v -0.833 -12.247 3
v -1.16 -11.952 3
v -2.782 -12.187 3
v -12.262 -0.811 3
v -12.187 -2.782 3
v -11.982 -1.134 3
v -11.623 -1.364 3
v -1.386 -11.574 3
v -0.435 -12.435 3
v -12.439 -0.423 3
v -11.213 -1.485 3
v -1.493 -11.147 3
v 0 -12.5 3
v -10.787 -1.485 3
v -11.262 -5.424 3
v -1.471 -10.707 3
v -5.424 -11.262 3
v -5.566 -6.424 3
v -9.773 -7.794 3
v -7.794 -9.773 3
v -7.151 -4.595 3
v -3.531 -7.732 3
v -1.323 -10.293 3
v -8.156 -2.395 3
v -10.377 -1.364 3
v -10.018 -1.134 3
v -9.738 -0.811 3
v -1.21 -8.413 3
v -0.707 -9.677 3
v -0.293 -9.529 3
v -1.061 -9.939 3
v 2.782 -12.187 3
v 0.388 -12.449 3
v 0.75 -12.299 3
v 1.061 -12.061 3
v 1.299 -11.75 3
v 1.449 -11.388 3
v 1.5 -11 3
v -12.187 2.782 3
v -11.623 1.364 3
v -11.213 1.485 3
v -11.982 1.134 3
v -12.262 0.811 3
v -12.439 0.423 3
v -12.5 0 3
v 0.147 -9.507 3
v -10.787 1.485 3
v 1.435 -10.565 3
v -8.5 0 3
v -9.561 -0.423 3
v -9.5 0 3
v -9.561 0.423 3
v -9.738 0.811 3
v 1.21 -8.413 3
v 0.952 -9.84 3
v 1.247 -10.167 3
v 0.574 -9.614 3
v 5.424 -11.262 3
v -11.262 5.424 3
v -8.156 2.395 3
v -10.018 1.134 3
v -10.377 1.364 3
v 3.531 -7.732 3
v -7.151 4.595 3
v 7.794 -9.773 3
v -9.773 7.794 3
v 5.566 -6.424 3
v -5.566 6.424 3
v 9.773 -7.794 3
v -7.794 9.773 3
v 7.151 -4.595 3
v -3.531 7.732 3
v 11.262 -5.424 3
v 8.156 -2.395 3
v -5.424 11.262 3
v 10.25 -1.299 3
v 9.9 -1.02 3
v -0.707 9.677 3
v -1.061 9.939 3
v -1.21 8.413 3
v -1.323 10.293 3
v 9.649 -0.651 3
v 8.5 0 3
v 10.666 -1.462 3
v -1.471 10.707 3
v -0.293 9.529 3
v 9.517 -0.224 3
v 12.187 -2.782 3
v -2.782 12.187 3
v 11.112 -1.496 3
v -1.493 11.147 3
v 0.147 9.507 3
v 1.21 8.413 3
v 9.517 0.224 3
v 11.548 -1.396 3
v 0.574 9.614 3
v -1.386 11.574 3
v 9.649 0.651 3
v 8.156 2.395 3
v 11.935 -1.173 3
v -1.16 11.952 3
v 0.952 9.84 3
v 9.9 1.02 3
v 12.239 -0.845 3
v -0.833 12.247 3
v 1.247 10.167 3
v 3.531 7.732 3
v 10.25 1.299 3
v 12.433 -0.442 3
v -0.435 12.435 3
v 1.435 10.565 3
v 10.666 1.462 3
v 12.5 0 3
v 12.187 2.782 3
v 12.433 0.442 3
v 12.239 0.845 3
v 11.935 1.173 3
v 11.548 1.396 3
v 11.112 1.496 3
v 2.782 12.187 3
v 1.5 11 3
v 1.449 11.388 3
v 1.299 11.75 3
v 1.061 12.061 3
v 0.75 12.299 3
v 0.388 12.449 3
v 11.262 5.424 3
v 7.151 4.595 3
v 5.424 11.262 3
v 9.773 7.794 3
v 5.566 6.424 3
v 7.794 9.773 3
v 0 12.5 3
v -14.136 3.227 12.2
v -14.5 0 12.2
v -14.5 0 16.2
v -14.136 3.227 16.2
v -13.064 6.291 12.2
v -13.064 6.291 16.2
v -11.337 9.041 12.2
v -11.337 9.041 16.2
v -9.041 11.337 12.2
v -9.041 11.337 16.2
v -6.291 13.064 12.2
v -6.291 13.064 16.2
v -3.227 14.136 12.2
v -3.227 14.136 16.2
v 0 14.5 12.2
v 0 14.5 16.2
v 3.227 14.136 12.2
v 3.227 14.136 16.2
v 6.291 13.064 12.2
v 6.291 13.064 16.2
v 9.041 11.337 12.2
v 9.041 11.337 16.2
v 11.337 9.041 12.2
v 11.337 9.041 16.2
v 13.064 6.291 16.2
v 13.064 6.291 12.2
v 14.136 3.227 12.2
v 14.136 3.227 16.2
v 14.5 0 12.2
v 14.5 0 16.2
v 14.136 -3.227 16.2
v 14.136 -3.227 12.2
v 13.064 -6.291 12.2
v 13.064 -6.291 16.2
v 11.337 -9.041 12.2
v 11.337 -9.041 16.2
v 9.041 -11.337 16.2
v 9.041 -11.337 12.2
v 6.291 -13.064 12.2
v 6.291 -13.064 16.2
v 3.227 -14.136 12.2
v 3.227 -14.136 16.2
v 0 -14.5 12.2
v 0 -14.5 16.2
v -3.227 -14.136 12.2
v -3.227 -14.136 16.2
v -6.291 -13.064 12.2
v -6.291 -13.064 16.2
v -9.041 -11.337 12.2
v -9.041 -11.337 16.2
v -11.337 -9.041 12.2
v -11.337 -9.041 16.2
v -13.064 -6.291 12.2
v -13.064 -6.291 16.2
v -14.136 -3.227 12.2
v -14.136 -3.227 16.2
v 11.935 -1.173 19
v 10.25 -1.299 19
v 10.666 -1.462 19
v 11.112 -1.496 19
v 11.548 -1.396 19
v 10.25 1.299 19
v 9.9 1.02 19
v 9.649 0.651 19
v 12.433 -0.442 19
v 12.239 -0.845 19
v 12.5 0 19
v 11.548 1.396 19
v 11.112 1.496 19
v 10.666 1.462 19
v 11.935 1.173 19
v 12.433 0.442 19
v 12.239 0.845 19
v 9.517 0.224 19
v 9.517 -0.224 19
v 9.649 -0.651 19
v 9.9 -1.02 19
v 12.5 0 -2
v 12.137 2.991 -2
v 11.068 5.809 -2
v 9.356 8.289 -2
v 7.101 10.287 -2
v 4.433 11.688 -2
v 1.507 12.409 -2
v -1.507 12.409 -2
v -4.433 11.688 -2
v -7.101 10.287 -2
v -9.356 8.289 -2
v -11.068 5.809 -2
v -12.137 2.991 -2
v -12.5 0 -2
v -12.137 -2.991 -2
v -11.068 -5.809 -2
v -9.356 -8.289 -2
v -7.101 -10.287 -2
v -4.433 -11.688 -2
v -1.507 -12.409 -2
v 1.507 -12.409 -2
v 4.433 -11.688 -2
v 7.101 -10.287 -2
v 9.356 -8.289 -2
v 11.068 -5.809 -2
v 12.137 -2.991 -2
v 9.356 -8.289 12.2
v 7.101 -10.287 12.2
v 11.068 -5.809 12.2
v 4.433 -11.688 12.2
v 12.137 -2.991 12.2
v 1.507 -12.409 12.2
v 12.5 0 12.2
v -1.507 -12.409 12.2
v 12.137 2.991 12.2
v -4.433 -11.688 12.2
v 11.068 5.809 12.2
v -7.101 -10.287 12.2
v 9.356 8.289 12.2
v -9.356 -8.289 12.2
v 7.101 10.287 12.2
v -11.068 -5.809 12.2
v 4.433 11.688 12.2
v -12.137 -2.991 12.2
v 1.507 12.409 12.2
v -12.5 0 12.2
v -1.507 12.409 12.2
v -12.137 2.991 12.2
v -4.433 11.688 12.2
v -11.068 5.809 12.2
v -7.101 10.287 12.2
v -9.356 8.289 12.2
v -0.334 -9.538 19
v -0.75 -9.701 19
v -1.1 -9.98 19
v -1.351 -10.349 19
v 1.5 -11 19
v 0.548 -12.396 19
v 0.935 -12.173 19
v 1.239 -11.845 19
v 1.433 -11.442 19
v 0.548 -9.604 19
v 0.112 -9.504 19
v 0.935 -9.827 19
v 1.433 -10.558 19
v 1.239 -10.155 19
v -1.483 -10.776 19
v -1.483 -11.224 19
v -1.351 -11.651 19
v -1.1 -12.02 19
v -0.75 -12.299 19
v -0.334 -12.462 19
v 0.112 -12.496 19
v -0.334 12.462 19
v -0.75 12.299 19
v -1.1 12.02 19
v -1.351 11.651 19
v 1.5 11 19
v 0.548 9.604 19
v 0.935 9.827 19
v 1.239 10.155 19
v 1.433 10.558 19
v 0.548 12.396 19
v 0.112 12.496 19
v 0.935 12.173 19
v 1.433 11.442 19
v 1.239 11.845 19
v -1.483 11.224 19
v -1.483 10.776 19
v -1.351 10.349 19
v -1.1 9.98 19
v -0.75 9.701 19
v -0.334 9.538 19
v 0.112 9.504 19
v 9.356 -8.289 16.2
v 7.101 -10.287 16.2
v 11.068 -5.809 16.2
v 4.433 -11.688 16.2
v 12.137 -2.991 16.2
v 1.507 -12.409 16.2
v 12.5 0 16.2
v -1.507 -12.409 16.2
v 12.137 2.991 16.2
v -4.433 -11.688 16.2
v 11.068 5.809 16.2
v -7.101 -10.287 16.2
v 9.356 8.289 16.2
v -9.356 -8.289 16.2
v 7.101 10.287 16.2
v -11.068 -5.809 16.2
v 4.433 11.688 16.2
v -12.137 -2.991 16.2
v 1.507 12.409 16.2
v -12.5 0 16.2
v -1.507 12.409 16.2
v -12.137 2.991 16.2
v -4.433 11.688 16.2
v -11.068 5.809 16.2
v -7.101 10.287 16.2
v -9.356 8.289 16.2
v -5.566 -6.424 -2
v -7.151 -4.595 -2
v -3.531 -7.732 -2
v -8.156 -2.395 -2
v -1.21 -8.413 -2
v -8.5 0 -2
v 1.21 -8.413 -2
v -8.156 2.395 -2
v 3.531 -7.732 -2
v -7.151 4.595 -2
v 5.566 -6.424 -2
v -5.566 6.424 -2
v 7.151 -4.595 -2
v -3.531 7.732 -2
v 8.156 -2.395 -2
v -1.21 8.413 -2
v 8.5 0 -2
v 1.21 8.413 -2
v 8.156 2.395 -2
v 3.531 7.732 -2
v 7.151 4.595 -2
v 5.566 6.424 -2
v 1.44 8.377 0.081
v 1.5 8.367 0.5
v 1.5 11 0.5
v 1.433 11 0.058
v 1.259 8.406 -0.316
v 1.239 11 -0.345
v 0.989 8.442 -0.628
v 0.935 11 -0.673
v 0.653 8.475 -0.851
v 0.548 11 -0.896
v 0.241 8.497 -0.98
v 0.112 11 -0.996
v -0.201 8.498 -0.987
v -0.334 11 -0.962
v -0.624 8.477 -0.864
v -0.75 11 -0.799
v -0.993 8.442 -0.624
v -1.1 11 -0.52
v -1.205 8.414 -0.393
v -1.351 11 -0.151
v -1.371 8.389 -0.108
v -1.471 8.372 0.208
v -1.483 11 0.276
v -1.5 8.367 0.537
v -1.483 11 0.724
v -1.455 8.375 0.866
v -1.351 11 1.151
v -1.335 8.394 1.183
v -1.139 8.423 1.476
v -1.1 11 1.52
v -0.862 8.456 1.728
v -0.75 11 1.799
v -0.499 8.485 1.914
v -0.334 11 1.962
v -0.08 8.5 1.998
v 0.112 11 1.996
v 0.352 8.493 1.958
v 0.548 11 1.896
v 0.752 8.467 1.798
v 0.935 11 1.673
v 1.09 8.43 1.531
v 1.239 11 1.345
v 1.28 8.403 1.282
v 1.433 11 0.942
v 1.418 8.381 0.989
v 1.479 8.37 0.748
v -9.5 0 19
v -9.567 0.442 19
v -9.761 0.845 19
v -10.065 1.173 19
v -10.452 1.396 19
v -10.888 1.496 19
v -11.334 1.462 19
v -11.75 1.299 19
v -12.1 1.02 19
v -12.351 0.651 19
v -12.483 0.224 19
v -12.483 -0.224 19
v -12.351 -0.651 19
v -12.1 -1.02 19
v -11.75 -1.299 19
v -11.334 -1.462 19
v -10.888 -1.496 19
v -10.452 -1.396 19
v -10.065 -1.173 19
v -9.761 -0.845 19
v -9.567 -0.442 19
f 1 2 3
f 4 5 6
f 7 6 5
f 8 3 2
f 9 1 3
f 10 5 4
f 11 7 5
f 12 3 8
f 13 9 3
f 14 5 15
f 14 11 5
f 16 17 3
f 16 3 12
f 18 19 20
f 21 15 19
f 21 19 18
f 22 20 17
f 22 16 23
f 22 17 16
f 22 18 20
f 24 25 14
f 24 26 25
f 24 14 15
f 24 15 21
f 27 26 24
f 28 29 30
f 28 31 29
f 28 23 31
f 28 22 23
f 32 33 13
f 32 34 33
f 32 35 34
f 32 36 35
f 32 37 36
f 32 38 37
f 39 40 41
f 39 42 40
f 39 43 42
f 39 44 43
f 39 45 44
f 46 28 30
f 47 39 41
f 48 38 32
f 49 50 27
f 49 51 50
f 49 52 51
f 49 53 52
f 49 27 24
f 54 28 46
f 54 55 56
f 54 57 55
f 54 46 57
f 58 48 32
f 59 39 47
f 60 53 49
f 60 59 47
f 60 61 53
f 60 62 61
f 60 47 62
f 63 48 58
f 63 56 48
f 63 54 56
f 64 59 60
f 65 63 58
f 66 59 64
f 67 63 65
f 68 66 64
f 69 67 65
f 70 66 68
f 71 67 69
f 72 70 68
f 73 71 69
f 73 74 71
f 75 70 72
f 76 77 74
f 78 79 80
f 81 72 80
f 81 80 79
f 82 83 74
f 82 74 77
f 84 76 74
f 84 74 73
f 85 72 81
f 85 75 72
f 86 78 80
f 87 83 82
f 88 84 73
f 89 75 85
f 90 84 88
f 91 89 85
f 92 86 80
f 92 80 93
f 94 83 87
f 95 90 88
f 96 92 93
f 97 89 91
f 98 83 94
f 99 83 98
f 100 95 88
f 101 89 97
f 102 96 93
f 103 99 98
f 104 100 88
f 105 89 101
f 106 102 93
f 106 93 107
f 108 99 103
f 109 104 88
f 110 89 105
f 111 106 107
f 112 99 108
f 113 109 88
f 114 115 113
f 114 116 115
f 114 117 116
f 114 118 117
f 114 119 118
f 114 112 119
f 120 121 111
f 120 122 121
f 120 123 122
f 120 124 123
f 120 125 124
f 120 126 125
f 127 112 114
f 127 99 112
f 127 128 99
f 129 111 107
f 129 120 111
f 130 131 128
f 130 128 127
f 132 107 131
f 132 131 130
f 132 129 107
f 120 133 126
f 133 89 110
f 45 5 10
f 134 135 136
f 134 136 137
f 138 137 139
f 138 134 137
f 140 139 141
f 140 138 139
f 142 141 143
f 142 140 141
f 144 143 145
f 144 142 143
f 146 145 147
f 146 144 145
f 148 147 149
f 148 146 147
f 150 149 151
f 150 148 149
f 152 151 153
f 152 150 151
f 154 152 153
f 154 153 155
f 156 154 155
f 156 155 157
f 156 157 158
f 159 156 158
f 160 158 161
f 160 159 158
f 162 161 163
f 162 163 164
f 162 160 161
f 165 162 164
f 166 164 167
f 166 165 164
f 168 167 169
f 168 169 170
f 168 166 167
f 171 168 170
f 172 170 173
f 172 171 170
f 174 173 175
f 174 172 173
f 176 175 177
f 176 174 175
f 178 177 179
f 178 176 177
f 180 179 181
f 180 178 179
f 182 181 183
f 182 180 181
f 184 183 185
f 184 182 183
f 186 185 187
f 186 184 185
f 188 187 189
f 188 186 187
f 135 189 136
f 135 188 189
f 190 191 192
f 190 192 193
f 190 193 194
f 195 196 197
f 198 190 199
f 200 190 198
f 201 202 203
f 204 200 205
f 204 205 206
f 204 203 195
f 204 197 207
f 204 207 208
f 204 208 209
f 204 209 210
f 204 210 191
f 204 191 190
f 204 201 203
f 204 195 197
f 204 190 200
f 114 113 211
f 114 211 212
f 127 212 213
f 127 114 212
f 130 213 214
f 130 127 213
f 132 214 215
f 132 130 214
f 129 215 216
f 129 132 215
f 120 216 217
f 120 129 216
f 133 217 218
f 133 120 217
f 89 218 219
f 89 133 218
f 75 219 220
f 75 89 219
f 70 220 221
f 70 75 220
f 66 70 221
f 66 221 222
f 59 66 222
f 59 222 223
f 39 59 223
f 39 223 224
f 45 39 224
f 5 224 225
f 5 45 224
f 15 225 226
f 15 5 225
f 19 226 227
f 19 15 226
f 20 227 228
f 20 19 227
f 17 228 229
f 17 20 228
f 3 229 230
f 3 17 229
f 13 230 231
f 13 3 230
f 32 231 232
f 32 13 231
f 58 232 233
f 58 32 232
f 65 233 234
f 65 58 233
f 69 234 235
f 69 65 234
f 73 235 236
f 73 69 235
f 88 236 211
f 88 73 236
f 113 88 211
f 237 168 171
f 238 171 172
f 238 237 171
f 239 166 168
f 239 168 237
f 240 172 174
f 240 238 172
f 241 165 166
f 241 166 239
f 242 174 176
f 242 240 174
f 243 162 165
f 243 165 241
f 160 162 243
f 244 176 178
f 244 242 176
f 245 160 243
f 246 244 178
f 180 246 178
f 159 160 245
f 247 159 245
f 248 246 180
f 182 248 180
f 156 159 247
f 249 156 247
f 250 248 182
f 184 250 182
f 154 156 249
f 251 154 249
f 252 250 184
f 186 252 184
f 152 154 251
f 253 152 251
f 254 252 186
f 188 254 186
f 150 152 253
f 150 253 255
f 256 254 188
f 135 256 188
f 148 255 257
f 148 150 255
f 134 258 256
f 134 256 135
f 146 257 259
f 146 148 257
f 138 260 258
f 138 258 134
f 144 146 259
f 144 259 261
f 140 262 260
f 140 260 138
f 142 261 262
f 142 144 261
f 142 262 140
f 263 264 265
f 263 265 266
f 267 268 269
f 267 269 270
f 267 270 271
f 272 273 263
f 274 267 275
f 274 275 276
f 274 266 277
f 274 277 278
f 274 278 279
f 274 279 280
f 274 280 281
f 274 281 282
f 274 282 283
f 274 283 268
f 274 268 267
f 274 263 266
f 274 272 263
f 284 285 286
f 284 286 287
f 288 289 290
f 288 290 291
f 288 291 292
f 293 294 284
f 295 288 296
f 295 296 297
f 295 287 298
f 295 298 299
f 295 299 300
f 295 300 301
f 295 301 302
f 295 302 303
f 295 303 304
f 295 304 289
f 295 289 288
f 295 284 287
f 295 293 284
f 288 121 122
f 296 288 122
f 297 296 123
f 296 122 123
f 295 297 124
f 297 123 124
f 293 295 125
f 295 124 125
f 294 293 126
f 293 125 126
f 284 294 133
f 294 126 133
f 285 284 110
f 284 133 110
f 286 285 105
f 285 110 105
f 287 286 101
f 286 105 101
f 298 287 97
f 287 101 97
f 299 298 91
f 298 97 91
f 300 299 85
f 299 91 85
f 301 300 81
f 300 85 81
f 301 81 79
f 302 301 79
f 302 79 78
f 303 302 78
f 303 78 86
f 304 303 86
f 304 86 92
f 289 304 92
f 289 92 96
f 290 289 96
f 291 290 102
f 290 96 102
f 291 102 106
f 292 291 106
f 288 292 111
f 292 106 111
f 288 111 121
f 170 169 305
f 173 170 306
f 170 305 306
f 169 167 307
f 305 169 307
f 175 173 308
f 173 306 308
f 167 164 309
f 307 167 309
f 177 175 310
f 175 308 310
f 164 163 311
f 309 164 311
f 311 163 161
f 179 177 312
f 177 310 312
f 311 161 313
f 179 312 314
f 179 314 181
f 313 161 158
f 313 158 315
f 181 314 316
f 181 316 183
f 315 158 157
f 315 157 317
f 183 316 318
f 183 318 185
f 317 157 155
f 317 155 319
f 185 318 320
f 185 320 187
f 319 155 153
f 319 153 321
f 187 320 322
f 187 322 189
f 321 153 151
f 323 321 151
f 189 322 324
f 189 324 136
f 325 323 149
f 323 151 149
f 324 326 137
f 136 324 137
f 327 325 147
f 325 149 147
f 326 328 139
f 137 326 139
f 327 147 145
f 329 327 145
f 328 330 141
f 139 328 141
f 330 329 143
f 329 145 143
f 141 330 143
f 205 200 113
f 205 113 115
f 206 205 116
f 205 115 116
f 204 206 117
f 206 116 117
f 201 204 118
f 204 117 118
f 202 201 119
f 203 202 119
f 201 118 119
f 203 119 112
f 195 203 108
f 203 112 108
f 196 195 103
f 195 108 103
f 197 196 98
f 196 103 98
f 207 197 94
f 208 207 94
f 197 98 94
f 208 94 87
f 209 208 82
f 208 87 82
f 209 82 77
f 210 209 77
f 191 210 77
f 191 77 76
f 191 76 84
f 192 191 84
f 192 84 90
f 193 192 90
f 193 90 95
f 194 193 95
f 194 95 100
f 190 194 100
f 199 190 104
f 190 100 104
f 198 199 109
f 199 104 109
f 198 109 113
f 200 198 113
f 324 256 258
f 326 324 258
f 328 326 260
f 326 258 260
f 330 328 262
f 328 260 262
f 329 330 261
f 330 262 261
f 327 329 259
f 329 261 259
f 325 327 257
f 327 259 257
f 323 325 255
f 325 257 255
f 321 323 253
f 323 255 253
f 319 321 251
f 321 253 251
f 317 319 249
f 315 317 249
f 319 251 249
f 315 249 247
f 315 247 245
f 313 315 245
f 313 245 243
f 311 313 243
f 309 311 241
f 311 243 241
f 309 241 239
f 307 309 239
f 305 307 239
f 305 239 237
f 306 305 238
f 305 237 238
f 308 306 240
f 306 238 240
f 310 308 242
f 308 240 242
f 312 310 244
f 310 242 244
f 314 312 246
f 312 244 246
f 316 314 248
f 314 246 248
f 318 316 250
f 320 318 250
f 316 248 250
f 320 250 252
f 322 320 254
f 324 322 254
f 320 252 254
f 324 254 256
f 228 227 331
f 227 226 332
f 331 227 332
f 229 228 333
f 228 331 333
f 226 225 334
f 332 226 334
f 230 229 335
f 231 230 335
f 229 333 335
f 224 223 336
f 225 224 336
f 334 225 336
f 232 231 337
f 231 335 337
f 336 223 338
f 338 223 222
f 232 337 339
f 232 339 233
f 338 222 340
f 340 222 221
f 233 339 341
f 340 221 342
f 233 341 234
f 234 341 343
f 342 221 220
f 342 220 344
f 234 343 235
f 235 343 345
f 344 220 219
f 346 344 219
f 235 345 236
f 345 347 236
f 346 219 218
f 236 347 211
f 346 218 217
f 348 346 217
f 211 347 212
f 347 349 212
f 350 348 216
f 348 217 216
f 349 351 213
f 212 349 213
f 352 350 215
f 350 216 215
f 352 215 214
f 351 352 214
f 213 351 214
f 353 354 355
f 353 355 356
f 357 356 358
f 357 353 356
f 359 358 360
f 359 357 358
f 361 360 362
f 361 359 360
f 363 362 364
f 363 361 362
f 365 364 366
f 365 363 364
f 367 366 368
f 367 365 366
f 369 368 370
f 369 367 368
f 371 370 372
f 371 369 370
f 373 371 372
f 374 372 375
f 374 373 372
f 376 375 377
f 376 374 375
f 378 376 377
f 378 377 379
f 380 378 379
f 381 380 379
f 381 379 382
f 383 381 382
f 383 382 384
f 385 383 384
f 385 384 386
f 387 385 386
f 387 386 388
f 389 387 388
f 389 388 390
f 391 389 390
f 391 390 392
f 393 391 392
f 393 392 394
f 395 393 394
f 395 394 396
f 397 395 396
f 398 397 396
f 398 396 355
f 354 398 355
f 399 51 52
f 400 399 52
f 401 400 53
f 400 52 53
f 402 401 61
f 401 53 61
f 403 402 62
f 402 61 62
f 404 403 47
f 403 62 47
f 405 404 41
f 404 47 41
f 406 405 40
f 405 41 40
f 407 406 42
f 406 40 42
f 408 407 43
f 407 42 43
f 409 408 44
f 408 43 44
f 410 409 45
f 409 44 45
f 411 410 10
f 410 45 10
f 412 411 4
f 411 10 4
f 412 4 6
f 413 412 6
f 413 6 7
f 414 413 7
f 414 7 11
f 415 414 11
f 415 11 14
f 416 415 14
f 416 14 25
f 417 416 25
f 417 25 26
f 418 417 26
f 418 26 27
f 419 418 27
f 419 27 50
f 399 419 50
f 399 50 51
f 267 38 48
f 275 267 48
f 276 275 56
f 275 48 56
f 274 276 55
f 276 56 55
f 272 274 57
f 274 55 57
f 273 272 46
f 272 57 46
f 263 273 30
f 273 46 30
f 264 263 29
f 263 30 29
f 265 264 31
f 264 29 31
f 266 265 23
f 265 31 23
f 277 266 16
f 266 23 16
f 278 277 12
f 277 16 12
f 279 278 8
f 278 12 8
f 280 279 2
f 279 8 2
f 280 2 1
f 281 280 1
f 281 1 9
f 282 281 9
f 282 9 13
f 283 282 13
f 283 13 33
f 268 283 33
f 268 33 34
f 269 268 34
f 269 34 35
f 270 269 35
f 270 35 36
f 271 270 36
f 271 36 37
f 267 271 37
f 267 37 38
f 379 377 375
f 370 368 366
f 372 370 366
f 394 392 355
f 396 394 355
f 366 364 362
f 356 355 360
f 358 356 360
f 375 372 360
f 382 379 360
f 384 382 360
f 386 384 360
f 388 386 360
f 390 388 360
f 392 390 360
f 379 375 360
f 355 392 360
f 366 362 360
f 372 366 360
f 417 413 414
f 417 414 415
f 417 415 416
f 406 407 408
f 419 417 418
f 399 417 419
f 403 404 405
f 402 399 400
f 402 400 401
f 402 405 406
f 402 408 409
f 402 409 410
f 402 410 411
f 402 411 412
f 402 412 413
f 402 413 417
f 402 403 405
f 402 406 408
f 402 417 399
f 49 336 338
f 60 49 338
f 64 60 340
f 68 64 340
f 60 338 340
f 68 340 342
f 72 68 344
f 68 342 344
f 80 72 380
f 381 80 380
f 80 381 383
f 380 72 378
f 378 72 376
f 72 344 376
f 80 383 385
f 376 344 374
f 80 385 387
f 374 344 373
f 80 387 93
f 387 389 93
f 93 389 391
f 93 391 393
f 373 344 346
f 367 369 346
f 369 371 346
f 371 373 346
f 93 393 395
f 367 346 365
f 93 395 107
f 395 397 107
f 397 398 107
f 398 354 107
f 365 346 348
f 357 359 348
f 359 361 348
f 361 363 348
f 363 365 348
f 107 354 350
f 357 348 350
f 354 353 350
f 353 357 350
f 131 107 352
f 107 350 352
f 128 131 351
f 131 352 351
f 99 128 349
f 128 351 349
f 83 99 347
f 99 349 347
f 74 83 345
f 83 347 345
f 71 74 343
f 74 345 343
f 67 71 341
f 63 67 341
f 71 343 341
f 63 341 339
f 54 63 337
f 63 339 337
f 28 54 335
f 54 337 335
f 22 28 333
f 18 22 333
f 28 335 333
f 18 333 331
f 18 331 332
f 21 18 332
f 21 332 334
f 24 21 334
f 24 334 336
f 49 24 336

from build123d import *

# Parameters (mm, degrees)
BOSS_EXTRUDE1_DEPTH      = 3
BOSS_EXTRUDE1_DEPTH_BACK = 2
SKETCH1_R                = 12.5
SKETCH2_R                = 8.5
CUT_EXTRUDE1_DEPTH       = 23
SKETCH3_R                = 1.5
BOSS_EXTRUDE2_DEPTH      = 16
SKETCH4_R                = 14.5
SKETCH4_R_2              = 12.5
BOSS_EXTRUDE4_DEPTH      = 4
SKETCH5_R                = 1.5
CUT_EXTRUDE2_DEPTH       = 11


with BuildPart() as part:
    # Sketch1 → Boss-Extrude1 (new, two sides: drawn at the far end of the back side and taken through both)
    with BuildSketch(Plane.XY.offset(-BOSS_EXTRUDE1_DEPTH_BACK)):
        Circle(SKETCH1_R)
    extrude(amount=BOSS_EXTRUDE1_DEPTH + BOSS_EXTRUDE1_DEPTH_BACK)

    # Sketch2 → Cut-Extrude1 (cut)
    with BuildSketch(Plane(origin=(0, 0, -2), x_dir=(-1, 0, 0), z_dir=(0, 0, -1))):
        Circle(SKETCH2_R)
    extrude(amount=-CUT_EXTRUDE1_DEPTH, mode=Mode.SUBTRACT)

    # Sketch3 → Boss-Extrude2 (add)
    with BuildSketch(Plane.XY.offset(3)):
        with Locations((0, 11)):
            Circle(SKETCH3_R)
        with Locations((11, 0)):
            Circle(SKETCH3_R)
        with Locations((0, -11)):
            Circle(SKETCH3_R)
        with Locations((-11, 0)):
            Circle(SKETCH3_R)
    extrude(amount=BOSS_EXTRUDE2_DEPTH)

    # Sketch5 → Cut-Extrude2 (cut)
    with BuildSketch(Plane(origin=(0, 0, 0), x_dir=(1, 0, 0), z_dir=(0, 1, 0))):
        with Locations((0, -0.5)):
            Circle(SKETCH5_R)
    extrude(amount=CUT_EXTRUDE2_DEPTH, mode=Mode.SUBTRACT)


with BuildPart() as body_2:
    # Sketch4 → Boss-Extrude4 (new body)
    with BuildSketch(Plane(origin=(0, 0, 12.2), x_dir=(-1, 0, 0), z_dir=(0, 0, -1))):
        Circle(SKETCH4_R)
        Circle(SKETCH4_R_2, mode=Mode.SUBTRACT)
    extrude(amount=-BOSS_EXTRUDE4_DEPTH)


solid = Compound([part.part, body_2.part])
